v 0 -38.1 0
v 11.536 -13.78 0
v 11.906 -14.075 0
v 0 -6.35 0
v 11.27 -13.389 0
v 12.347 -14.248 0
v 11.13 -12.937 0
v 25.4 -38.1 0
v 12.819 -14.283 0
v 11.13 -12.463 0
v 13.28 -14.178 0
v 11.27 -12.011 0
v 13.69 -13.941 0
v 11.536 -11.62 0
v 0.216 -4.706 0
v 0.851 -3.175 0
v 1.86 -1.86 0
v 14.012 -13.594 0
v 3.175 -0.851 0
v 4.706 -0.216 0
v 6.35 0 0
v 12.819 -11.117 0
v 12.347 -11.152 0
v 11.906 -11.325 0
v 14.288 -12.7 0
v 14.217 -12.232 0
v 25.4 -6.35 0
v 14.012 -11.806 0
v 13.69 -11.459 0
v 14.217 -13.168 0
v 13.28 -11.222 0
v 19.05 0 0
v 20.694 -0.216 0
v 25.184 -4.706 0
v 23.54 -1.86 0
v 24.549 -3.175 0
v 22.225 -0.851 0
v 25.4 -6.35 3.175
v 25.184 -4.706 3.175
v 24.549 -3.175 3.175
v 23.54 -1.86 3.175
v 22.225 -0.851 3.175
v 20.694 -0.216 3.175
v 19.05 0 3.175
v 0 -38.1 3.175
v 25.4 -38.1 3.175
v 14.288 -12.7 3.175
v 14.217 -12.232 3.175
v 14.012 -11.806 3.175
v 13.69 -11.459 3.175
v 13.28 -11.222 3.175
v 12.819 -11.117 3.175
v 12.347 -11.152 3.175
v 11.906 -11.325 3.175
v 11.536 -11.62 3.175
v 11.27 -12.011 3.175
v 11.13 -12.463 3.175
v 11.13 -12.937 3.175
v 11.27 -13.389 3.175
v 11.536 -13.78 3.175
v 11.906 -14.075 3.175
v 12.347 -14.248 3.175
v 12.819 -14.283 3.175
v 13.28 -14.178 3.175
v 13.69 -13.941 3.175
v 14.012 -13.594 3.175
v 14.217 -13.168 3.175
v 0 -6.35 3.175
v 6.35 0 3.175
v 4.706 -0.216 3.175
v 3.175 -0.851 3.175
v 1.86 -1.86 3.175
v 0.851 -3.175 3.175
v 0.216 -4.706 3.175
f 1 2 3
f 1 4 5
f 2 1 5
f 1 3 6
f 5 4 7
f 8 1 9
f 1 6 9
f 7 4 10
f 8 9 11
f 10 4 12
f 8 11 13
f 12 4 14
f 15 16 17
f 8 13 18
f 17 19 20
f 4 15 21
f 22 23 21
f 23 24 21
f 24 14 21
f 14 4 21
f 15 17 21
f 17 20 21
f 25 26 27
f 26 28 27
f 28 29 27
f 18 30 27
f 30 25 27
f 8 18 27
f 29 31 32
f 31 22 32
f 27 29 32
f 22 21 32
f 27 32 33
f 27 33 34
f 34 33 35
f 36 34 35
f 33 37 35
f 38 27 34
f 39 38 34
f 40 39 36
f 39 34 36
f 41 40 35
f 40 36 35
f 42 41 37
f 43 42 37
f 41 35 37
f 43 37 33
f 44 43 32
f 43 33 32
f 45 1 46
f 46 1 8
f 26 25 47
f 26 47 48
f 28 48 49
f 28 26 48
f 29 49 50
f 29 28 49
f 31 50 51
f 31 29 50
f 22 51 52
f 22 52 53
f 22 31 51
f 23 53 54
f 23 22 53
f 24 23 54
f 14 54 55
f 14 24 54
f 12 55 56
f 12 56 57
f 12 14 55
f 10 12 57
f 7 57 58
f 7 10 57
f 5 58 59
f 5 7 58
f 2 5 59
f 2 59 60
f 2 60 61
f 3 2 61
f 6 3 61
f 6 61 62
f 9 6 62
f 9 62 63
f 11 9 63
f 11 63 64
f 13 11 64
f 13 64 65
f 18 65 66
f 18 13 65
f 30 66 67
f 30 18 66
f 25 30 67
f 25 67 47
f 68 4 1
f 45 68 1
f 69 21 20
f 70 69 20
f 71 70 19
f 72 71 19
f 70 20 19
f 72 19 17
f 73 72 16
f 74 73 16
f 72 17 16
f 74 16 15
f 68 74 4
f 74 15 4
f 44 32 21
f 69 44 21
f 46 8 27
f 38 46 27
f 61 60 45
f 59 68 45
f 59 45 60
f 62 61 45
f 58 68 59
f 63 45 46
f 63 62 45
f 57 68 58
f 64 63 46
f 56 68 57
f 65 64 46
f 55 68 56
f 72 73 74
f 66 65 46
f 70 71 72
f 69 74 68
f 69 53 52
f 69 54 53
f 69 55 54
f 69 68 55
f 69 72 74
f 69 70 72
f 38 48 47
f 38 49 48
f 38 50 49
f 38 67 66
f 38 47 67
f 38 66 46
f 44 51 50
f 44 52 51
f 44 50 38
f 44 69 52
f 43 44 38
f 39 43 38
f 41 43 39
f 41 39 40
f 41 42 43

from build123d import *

# Parameters (mm, degrees)
F0_R     = 1.5875
F1_DEPTH = 3.175


with BuildPart() as f1:
    # F0 (on Top) → F1 (new body)
    with BuildSketch(Plane.XY):
        with BuildLine():
            Line((19.05, 0), (6.35, 0))
            ThreePointArc((6.35, 0), (1.859872, -1.859872), (0, -6.35))
            Line((0, -6.35), (0, -38.1))
            Line((0, -38.1), (25.4, -38.1))
            Line((25.4, -38.1), (25.4, -6.35))
            ThreePointArc((25.4, -6.35), (23.540128, -1.859872), (19.05, 0))
        make_face()
        with Locations((12.7, -12.7)):
            Circle(F0_R, mode=Mode.SUBTRACT)
    extrude(amount=F1_DEPTH)


solid = f1.part
